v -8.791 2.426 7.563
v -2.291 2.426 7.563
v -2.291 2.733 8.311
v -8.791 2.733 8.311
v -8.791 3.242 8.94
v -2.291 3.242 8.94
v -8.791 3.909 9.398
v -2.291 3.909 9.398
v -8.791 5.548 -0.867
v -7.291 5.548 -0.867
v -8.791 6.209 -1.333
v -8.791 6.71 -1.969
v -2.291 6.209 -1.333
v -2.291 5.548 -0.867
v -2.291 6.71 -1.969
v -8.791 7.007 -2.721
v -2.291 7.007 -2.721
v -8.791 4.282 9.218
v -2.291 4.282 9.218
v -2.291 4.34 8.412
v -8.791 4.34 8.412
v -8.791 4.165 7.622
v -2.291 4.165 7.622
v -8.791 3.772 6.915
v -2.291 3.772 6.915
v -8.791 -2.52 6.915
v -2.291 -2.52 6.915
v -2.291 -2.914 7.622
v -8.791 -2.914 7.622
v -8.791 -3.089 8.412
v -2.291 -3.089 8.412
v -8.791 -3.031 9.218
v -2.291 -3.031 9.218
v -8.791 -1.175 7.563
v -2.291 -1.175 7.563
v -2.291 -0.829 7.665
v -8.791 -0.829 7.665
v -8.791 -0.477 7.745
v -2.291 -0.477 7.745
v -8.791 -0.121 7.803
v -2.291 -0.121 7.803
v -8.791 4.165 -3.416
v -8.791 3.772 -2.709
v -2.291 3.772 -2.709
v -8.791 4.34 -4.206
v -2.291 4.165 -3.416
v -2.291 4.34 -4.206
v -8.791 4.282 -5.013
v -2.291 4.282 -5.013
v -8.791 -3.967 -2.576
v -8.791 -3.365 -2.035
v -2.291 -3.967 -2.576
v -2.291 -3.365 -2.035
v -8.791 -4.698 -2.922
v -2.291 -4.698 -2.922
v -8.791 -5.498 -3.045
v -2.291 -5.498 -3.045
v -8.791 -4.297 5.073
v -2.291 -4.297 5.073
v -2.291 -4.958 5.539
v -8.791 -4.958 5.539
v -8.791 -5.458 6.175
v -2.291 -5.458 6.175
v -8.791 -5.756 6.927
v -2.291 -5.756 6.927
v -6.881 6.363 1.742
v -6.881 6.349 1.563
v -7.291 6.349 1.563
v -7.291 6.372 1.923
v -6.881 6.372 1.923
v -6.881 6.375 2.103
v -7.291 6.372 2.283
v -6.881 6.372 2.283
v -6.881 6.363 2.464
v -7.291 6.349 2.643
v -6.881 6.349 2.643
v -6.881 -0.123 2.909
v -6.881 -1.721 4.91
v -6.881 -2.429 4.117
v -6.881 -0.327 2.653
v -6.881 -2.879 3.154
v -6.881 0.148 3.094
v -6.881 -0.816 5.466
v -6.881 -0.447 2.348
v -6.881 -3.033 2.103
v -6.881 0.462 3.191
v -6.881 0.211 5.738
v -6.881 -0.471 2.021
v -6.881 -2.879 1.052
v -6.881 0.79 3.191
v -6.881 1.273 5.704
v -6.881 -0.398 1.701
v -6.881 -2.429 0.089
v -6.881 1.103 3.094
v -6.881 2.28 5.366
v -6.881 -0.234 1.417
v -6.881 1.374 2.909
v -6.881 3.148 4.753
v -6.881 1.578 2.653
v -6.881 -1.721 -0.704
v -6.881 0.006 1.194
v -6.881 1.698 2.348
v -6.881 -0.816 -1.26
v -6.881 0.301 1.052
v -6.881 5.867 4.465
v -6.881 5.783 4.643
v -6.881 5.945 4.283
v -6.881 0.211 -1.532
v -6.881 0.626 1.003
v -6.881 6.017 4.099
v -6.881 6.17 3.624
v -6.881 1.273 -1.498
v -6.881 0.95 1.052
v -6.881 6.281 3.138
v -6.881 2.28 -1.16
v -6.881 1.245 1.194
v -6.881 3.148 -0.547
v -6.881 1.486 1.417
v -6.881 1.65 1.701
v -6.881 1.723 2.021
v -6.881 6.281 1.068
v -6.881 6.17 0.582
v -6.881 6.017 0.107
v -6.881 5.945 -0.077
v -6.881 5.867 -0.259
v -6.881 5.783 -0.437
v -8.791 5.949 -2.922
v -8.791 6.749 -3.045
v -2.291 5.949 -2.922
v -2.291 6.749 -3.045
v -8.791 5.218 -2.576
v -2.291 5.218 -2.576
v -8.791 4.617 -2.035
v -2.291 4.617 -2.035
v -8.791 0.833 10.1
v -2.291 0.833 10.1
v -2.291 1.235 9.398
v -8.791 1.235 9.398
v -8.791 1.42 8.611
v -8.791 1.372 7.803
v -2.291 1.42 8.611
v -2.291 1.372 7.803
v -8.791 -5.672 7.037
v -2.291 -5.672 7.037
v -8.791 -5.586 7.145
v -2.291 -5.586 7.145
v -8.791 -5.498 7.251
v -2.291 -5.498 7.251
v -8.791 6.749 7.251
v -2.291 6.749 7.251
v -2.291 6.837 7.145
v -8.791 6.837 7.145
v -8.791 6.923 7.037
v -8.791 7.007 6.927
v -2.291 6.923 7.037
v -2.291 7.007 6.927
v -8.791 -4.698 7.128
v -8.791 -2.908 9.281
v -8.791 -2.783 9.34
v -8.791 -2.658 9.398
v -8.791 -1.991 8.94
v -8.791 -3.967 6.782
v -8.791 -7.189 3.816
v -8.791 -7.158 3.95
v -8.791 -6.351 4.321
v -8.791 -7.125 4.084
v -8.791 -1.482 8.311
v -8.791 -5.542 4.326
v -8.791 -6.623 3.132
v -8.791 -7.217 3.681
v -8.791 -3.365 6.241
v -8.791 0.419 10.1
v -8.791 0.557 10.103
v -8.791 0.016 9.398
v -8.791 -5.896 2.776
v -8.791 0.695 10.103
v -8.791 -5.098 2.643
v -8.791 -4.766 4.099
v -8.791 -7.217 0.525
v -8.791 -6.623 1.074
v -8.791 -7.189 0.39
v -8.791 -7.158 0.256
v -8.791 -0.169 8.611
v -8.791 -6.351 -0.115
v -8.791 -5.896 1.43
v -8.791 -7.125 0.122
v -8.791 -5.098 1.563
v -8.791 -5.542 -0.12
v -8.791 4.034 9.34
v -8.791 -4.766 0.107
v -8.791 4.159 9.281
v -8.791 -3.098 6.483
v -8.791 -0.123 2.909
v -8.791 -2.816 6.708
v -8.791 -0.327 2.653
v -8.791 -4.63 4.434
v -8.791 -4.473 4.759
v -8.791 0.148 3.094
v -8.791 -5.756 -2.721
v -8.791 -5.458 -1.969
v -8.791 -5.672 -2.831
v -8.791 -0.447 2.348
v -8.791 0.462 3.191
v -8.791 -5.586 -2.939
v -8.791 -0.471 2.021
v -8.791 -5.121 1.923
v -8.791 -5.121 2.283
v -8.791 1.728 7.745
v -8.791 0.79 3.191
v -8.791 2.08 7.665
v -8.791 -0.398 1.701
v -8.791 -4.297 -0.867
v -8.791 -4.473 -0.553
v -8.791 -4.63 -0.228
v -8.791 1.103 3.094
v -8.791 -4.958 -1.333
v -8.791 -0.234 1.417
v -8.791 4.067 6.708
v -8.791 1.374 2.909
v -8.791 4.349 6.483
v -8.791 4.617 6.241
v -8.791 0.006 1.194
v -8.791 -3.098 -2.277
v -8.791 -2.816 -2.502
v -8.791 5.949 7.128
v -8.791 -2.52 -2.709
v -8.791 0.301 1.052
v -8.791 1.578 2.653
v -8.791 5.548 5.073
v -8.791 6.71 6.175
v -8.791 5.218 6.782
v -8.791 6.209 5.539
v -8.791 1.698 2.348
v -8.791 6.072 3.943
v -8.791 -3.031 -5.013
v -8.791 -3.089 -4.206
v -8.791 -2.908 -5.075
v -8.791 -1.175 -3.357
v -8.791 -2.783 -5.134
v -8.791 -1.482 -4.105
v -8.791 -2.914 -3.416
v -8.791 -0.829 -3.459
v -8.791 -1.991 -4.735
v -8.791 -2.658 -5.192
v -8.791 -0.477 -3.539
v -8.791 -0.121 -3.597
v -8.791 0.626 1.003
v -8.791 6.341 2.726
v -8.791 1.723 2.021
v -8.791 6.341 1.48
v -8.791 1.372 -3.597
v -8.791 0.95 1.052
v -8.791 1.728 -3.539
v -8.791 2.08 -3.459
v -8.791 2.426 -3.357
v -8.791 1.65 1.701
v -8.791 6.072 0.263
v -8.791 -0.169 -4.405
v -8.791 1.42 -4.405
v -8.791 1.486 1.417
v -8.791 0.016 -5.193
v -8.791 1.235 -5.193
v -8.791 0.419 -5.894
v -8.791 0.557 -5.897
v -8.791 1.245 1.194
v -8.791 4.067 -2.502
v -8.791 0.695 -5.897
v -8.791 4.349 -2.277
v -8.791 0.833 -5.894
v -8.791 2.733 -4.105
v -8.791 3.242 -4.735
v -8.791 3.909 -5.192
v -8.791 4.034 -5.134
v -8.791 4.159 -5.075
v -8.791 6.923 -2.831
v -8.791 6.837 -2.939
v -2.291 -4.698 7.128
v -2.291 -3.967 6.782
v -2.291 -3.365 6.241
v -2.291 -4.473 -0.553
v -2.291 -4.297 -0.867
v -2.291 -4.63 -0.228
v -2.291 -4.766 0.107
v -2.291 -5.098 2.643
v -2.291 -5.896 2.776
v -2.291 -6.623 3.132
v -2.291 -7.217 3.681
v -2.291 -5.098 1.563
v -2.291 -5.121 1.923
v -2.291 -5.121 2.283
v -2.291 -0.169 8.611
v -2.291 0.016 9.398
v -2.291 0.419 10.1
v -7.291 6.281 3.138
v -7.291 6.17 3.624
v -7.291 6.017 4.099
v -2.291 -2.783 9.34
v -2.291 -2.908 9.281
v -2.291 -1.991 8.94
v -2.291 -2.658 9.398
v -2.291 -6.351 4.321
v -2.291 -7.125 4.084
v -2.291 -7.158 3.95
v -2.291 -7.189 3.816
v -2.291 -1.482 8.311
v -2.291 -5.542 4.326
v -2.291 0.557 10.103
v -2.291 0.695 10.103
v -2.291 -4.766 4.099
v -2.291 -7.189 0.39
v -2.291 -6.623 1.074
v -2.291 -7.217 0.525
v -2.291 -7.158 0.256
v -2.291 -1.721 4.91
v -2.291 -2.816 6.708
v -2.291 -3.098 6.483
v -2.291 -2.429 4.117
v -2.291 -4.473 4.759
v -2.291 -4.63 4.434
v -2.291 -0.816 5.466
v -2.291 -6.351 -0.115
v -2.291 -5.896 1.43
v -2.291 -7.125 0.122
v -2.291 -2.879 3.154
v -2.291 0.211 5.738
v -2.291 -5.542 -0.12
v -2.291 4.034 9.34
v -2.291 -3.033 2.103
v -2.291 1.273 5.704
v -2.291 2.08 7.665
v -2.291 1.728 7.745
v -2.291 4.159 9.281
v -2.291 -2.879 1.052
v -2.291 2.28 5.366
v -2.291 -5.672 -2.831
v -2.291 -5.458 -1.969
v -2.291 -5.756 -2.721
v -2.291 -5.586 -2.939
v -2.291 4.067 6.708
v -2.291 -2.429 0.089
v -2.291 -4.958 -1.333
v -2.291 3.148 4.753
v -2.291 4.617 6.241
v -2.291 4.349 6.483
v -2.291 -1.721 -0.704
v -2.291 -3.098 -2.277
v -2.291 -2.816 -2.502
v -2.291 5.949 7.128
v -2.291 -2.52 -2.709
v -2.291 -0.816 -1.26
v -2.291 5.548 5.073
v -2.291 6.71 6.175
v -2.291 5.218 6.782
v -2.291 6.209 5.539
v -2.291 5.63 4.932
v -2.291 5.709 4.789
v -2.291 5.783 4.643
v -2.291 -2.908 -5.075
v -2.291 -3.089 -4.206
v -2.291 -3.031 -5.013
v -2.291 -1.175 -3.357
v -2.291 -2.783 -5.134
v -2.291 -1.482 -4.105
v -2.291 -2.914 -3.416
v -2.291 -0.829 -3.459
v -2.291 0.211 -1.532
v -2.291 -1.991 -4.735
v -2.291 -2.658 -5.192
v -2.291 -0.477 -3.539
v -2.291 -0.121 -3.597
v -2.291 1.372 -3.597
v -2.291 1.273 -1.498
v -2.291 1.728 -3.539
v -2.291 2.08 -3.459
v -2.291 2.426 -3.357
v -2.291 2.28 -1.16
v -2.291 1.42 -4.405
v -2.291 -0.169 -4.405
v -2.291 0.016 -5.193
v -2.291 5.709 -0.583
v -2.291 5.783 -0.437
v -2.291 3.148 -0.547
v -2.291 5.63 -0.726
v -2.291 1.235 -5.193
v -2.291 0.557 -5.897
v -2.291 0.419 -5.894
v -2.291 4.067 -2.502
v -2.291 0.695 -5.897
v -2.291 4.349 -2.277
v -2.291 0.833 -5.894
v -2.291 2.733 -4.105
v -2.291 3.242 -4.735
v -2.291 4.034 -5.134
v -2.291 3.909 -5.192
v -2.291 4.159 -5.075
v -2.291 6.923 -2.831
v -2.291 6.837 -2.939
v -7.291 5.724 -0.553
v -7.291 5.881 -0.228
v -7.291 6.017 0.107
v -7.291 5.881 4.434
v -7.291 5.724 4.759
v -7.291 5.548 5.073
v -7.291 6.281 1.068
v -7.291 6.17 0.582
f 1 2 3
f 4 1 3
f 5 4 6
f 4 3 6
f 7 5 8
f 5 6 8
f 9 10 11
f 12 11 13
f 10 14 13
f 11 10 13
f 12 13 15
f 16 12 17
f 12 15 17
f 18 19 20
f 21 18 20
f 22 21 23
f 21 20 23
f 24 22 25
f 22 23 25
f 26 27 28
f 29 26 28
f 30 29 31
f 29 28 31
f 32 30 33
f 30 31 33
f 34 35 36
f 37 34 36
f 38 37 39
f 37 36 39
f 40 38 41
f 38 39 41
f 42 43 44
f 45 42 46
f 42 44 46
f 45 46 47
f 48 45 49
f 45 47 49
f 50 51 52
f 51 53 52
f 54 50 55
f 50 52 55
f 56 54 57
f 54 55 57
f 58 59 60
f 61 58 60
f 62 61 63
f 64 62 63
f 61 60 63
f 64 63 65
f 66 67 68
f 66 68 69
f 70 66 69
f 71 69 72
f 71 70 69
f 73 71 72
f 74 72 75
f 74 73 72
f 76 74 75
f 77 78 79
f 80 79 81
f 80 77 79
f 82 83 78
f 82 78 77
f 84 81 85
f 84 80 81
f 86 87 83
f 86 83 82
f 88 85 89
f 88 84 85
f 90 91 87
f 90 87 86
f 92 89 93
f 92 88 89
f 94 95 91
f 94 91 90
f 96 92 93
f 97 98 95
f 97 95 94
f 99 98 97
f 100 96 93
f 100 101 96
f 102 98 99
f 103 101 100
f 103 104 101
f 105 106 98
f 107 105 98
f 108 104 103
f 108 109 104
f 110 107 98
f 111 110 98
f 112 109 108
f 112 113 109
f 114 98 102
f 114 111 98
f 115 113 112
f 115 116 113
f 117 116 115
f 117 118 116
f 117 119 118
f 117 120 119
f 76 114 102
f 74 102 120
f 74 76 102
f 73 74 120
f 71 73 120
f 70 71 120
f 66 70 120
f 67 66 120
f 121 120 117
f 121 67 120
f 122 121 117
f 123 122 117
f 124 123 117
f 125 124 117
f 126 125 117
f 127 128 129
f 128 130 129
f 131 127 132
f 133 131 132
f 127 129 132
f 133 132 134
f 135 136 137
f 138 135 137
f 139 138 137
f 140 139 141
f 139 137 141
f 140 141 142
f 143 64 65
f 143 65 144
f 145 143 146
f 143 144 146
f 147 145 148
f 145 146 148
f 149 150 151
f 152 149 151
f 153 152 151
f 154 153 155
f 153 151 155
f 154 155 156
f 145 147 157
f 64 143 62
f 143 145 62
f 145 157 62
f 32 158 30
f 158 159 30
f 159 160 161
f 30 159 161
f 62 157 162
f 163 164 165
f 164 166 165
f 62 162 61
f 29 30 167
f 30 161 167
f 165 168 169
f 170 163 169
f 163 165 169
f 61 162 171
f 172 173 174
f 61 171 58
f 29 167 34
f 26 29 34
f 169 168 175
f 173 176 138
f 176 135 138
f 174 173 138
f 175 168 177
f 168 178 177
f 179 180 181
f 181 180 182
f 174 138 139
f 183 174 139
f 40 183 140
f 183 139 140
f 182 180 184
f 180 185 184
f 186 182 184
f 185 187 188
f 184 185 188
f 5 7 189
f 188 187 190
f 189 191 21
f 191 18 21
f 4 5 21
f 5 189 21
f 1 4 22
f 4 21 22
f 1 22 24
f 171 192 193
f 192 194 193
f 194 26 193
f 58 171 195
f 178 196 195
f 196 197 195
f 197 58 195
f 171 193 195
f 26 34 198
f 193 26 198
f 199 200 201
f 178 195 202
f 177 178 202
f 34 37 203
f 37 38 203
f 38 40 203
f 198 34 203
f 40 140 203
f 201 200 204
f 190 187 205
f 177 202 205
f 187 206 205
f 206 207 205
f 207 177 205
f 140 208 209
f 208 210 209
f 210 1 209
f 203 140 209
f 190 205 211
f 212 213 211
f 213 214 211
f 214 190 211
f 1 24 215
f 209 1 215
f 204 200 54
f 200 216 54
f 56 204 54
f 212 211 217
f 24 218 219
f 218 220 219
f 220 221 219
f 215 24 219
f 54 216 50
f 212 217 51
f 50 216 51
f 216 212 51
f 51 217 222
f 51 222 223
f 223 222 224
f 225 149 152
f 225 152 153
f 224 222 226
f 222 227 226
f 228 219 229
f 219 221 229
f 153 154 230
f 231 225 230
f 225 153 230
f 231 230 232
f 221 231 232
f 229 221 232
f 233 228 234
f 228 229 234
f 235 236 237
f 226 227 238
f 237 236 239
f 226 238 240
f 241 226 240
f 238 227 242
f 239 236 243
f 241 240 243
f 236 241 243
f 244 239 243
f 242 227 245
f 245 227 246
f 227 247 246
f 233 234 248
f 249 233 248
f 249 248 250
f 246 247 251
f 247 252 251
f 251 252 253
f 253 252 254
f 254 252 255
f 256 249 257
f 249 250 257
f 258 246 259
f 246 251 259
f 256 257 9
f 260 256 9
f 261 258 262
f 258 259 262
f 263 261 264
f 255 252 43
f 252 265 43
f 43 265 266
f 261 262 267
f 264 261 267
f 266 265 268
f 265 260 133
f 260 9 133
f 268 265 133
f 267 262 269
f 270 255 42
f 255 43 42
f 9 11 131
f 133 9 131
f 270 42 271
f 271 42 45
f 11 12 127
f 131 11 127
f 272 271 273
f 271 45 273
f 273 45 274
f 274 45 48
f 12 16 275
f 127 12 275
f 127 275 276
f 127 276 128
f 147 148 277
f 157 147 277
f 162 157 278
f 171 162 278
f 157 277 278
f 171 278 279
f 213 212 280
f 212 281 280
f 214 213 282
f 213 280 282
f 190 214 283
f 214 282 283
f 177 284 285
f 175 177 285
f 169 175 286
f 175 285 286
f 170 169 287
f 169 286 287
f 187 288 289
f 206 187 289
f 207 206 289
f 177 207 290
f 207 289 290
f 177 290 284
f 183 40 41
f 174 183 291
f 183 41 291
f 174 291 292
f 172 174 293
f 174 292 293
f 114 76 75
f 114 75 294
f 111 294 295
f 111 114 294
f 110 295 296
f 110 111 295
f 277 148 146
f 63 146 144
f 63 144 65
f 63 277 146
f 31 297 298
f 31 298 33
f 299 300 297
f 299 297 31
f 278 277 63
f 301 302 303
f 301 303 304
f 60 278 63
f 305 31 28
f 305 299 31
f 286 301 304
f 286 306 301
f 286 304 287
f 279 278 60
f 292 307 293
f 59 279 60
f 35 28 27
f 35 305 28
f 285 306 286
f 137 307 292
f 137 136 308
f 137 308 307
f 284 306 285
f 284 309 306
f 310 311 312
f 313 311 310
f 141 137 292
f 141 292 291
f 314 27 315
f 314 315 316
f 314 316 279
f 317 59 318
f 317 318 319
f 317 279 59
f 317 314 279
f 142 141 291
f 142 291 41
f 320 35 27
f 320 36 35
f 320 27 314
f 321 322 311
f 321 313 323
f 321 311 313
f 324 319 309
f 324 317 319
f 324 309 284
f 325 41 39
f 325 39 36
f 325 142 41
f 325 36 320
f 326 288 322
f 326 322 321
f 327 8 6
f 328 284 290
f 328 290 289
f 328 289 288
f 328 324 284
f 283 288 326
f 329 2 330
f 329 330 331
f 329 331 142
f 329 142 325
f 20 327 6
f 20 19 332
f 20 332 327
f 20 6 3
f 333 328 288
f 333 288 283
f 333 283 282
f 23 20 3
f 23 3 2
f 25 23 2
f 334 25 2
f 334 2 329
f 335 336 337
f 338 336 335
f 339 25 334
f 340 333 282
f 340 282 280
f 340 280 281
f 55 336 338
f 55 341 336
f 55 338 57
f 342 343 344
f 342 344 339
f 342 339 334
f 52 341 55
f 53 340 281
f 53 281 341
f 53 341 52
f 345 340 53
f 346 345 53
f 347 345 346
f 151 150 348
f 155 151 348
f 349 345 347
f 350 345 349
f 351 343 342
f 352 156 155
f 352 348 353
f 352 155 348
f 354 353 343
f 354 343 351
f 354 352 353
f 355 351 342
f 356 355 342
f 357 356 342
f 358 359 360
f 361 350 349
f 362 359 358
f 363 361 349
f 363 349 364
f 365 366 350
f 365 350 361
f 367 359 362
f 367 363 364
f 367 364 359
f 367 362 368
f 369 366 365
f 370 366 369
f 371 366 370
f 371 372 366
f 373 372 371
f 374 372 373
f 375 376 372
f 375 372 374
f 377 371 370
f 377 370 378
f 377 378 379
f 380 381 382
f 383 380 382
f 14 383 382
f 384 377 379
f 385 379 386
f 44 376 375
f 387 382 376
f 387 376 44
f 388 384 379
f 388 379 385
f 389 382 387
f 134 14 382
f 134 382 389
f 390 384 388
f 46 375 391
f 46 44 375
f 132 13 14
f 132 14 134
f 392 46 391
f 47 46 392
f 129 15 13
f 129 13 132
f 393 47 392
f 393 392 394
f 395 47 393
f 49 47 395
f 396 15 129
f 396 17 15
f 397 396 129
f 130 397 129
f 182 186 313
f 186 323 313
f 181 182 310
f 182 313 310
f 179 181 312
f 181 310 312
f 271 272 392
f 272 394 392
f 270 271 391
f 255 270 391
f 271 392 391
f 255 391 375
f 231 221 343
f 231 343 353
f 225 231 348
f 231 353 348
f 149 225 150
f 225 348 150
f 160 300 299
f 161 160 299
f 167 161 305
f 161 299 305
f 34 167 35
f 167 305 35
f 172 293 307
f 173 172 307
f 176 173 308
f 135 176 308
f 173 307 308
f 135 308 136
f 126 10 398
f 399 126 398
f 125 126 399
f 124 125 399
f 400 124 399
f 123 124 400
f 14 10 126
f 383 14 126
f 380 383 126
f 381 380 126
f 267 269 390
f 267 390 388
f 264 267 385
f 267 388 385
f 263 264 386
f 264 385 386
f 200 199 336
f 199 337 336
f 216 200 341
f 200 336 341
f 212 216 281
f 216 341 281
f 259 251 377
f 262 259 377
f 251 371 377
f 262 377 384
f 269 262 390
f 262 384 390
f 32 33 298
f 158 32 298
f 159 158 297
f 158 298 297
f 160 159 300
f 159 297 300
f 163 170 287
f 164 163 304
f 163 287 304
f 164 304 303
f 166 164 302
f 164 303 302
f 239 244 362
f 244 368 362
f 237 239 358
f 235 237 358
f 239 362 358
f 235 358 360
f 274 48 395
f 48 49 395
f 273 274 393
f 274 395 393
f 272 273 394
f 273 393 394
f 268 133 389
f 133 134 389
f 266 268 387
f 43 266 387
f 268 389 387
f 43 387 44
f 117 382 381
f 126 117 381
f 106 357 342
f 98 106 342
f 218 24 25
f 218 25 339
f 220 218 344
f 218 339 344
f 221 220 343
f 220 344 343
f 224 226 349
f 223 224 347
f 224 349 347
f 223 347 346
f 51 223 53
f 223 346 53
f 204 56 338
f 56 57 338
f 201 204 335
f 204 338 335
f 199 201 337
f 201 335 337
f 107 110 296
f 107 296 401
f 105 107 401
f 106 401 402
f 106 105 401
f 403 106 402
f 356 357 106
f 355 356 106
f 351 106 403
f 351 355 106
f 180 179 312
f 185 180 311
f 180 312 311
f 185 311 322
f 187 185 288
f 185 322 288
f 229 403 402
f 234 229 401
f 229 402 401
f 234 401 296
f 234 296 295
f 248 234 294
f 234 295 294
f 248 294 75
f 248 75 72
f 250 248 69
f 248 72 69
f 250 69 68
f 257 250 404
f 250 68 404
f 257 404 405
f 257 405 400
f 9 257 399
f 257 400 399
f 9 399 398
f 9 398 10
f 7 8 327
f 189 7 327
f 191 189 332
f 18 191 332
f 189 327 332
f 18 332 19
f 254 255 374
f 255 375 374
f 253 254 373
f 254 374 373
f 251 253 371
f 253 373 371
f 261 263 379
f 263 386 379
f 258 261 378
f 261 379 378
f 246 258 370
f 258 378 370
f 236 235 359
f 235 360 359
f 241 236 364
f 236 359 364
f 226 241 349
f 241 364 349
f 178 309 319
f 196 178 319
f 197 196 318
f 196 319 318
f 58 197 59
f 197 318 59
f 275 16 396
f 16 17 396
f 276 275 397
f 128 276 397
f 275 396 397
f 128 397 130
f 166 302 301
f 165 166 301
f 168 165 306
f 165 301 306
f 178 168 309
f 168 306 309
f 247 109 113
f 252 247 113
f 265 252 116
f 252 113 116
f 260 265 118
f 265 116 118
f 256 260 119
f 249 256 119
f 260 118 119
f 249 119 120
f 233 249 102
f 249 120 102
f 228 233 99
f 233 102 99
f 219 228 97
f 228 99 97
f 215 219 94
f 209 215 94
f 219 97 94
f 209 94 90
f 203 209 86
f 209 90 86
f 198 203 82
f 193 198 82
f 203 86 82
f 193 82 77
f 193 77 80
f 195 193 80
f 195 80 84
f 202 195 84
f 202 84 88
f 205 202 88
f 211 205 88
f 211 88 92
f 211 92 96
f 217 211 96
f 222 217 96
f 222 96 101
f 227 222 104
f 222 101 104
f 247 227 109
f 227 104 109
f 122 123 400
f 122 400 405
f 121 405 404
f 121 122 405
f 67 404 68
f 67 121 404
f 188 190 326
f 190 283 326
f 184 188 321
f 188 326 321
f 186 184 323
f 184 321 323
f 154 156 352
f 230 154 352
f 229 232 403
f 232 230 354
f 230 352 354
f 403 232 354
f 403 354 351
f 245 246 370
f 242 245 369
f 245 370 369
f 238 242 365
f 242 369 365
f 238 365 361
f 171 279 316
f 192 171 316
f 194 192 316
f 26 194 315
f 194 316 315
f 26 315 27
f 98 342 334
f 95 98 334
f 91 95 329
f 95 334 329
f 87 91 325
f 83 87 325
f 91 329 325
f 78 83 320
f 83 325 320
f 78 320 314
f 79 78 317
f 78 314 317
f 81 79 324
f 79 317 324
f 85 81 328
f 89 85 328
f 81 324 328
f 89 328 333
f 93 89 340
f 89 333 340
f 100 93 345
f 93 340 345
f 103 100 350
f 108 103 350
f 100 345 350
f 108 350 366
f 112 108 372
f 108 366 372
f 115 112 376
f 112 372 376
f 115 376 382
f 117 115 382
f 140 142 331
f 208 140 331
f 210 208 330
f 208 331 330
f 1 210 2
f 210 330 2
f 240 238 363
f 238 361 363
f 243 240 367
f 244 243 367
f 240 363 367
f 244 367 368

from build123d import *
from build123d.topology import SkipClean

# Parameters (mm, degrees)
SKETCH1_R           = 2
BOSS_EXTRUDE1_DEPTH = 5
SKETCH2_R           = 2
CUT_EXTRUDE1_DEPTH  = 4.59
CUT_EXTRUDE2_DEPTH  = 4.59
SKETCH4_R           = 2
BOSS_EXTRUDE2_DEPTH = 1.5
SKETCH5_R           = 2
SKETCH5_R_2         = 1.1
BOSS_EXTRUDE3_DEPTH = 1.91


with BuildPart() as part:
    # Sketch1 → Boss-Extrude1 (new body)
    with BuildSketch(Plane(origin=(-2.290735361, 0, 0), x_dir=(0, 0, -1), z_dir=(1, 0, 0))):
        with BuildLine():
            ThreePointArc((-9.21847302, -3.030854589), (-8.010225793, -3.030179432), (-6.914755008, -2.520468161))
            ThreePointArc((-6.914755008, -2.520468161), (-6.597726247, -2.958835077), (-6.240895641, -3.365461082))
            ThreePointArc((-6.240895641, -3.365461082), (-6.981592568, -4.320044698), (-7.251111098, -5.497848409))
            ThreePointArc((-7.251111098, -5.497848409), (-7.090895469, -5.629044066), (-6.927337829, -5.756048975))
            ThreePointArc((-6.927337829, -5.756048975), (-5.839037632, -5.231201855), (-5.073207991, -4.296660909))
            ThreePointArc((-5.073207991, -4.296660909), (-4.59737467, -4.554062228), (-4.099452992, -4.765596601))
            ThreePointArc((-4.099452992, -4.765596601), (-4.352619555, -5.947023074), (-4.084417482, -7.125127257))
            ThreePointArc((-4.084417482, -7.125127257), (-3.883144525, -7.173815504), (-3.680678819, -7.217277972))
            ThreePointArc((-3.680678819, -7.217277972), (-2.927876853, -6.272211298), (-2.643370309, -5.097937972))
            ThreePointArc((-2.643370309, -5.097937972), (-2.102977054, -5.123392206), (-1.562583798, -5.097937972))
            ThreePointArc((-1.562583798, -5.097937972), (-1.278077254, -6.272211298), (-0.525275288, -7.217277972))
            ThreePointArc((-0.525275288, -7.217277972), (-0.322809582, -7.173815504), (-0.121536626, -7.125127257))
            ThreePointArc((-0.121536626, -7.125127257), (0.146665447, -5.947023074), (-0.106501116, -4.765596601))
            ThreePointArc((-0.106501116, -4.765596601), (0.391420562, -4.554062228), (0.867253884, -4.296660909))
            ThreePointArc((0.867253884, -4.296660909), (1.633083524, -5.231201855), (2.721383721, -5.756048975))
            ThreePointArc((2.721383721, -5.756048975), (2.884941361, -5.629044066), (3.04515699, -5.497848409))
            ThreePointArc((3.04515699, -5.497848409), (2.77563846, -4.320044698), (2.034941533, -3.365461082))
            ThreePointArc((2.034941533, -3.365461082), (2.391772139, -2.958835077), (2.708800901, -2.520468161))
            ThreePointArc((2.708800901, -2.520468161), (3.804271685, -3.030179432), (5.012518913, -3.030854589))
            ThreePointArc((5.012518913, -3.030854589), (5.104773889, -2.845462119), (5.192199521, -2.65774396))
            ThreePointArc((5.192199521, -2.65774396), (4.438341838, -1.713519192), (3.356818658, -1.174845424))
            ThreePointArc((3.356818658, -1.174845424), (3.501883513, -0.653665056), (3.597316282, -0.121156487))
            ThreePointArc((3.597316282, -0.121156487), (4.805456786, -0.105083514), (5.894342862, 0.418547016))
            ThreePointArc((5.894342862, 0.418547016), (5.897022946, 0.625607794), (5.894342862, 0.832668571))
            ThreePointArc((5.894342862, 0.832668571), (4.805456786, 1.356299101), (3.597316282, 1.372372074))
            ThreePointArc((3.597316282, 1.372372074), (3.501883513, 1.904880643), (3.356818658, 2.426061011))
            ThreePointArc((3.356818658, 2.426061011), (4.438341838, 2.964734779), (5.192199521, 3.908959547))
            ThreePointArc((5.192199521, 3.908959547), (5.104773889, 4.096677707), (5.012518913, 4.282070176))
            ThreePointArc((5.012518913, 4.282070176), (3.804271685, 4.281395019), (2.708800901, 3.771683749))
            ThreePointArc((2.708800901, 3.771683749), (2.391772139, 4.210050664), (2.034941533, 4.616676669))
            ThreePointArc((2.034941533, 4.616676669), (2.77563846, 5.571260286), (3.04515699, 6.749063996))
            ThreePointArc((3.04515699, 6.749063996), (2.884941361, 6.880259653), (2.721383721, 7.007264562))
            ThreePointArc((2.721383721, 7.007264562), (1.633083524, 6.482417443), (0.867253884, 5.547876496))
            ThreePointArc((0.867253884, 5.547876496), (0.391420562, 5.805277815), (-0.106501116, 6.016812189))
            ThreePointArc((-0.106501116, 6.016812189), (0.146665447, 7.198238661), (-0.121536626, 8.376342845))
            ThreePointArc((-0.121536626, 8.376342845), (-0.322809582, 8.425031091), (-0.525275288, 8.46849356))
            ThreePointArc((-0.525275288, 8.46849356), (-1.278077254, 7.523426886), (-1.562583798, 6.349153559))
            ThreePointArc((-1.562583798, 6.349153559), (-2.102977054, 6.374607794), (-2.643370309, 6.349153559))
            ThreePointArc((-2.643370309, 6.349153559), (-2.927876853, 7.523426886), (-3.680678819, 8.46849356))
            ThreePointArc((-3.680678819, 8.46849356), (-3.883144525, 8.425031091), (-4.084417482, 8.376342845))
            ThreePointArc((-4.084417482, 8.376342845), (-4.352619555, 7.198238661), (-4.099452992, 6.016812189))
            ThreePointArc((-4.099452992, 6.016812189), (-4.59737467, 5.805277815), (-5.073207991, 5.547876496))
            ThreePointArc((-5.073207991, 5.547876496), (-5.839037632, 6.482417443), (-6.927337829, 7.007264562))
            ThreePointArc((-6.927337829, 7.007264562), (-7.090895469, 6.880259653), (-7.251111098, 6.749063996))
            ThreePointArc((-7.251111098, 6.749063996), (-6.981592568, 5.571260286), (-6.240895641, 4.616676669))
            ThreePointArc((-6.240895641, 4.616676669), (-6.597726247, 4.210050664), (-6.914755008, 3.771683749))
            ThreePointArc((-6.914755008, 3.771683749), (-8.010225793, 4.281395019), (-9.21847302, 4.282070176))
            ThreePointArc((-9.21847302, 4.282070176), (-9.310727997, 4.096677707), (-9.398153629, 3.908959547))
            ThreePointArc((-9.398153629, 3.908959547), (-8.644295946, 2.964734779), (-7.562772765, 2.426061011))
            ThreePointArc((-7.562772765, 2.426061011), (-7.707837621, 1.904880643), (-7.803270389, 1.372372074))
            ThreePointArc((-7.803270389, 1.372372074), (-9.011410893, 1.356299101), (-10.10029697, 0.832668571))
            ThreePointArc((-10.10029697, 0.832668571), (-10.102977054, 0.625607794), (-10.10029697, 0.418547016))
            ThreePointArc((-10.10029697, 0.418547016), (-9.011410893, -0.105083514), (-7.803270389, -0.121156487))
            ThreePointArc((-7.803270389, -0.121156487), (-7.707837621, -0.653665056), (-7.562772765, -1.174845424))
            ThreePointArc((-7.562772765, -1.174845424), (-8.644295946, -1.713519192), (-9.398153629, -2.65774396))
            ThreePointArc((-9.398153629, -2.65774396), (-9.310727997, -2.845462119), (-9.21847302, -3.030854589))
        make_face()
        with Locations(Location((-2.102977054, 0.625607794, 0), (0, 0, 180))):
            Circle(SKETCH1_R, mode=Mode.SUBTRACT)
    extrude(amount=-BOSS_EXTRUDE1_DEPTH)

    # Sketch2 → Cut-Extrude1 (cut)
    with BuildSketch(Plane(origin=(-2.290735361, 0, 0), x_dir=(0, 0, -1), z_dir=(1, 0, 0))):
        with BuildLine():
            ThreePointArc((-1.562583798, 6.349153559), (-1.832480848, 6.368240709), (-2.102977054, 6.374607794))
            ThreePointArc((-2.102977054, 6.374607794), (-2.373473259, 6.368240709), (-2.643370309, 6.349153559))
            ThreePointArc((-2.643370309, 6.349153559), (-2.927876853, 7.523426886), (-3.680678819, 8.46849356))
            ThreePointArc((-3.680678819, 8.46849356), (-3.883144525, 8.425031091), (-4.084417482, 8.376342845))
            ThreePointArc((-4.084417482, 8.376342845), (-4.352619555, 7.198238661), (-4.099452992, 6.016812189))
            ThreePointArc((-4.099452992, 6.016812189), (-4.374229098, 5.906934819), (-4.642987089, 5.783063564))
            Line((-4.642987089, 5.783063564), (-4.752977054, 3.148295163))
            ThreePointArc((-4.752977054, 3.148295163), (-2.102977054, -3.033142206), (0.547022946, 3.148295163))
            Line((0.547022946, 3.148295163), (0.437032981, 5.783063564))
            ThreePointArc((0.437032981, 5.783063564), (0.168274991, 5.906934819), (-0.106501116, 6.016812189))
            ThreePointArc((-0.106501116, 6.016812189), (0.146665447, 7.198238661), (-0.121536626, 8.376342845))
            ThreePointArc((-0.121536626, 8.376342845), (-0.322809582, 8.425031091), (-0.525275288, 8.46849356))
            ThreePointArc((-0.525275288, 8.46849356), (-1.278077254, 7.523426886), (-1.562583798, 6.349153559))
        make_face()
        with Locations((-2.102977054, 0.625607794)):
            Circle(SKETCH2_R, mode=Mode.SUBTRACT)
    extrude(amount=-CUT_EXTRUDE1_DEPTH, mode=Mode.SUBTRACT)

    # Sketch3 → Cut-Extrude2 (cut)
    with BuildSketch(Plane(origin=(-6.880735361, 0, 0), x_dir=(0, 0, -1), z_dir=(1, 0, 0))):
        with BuildLine():
            Line((-4.428262518, 5.883368582), (-5.037365747, 8.852267241))
            Line((-5.037365747, 8.852267241), (0.413398915, 8.665739173))
            Line((0.413398915, 8.665739173), (0.316720883, 5.840592251))
            ThreePointArc((0.316720883, 5.840592251), (-2.051151554, 6.374374193), (-4.428262518, 5.883368582))
        make_face()
    extrude(amount=-CUT_EXTRUDE2_DEPTH, mode=Mode.SUBTRACT)

    # Sketch4 → Boss-Extrude2 (add)
    with SkipClean():  # the faces are left unmerged after this step: merging them gives an invalid solid
        with BuildSketch(Plane.ZY.offset(7.290735361)):
            with BuildLine():
                ThreePointArc((6.927337829, 7.007264562), (5.839037632, 6.482417443), (5.073207991, 5.547876496))
                ThreePointArc((5.073207991, 5.547876496), (2.102977054, 6.374607794), (-0.867253884, 5.547876496))
                ThreePointArc((-0.867253884, 5.547876496), (-1.633083524, 6.482417443), (-2.721383721, 7.007264562))
                ThreePointArc((-2.721383721, 7.007264562), (-2.884941361, 6.880259653), (-3.04515699, 6.749063996))
                ThreePointArc((-3.04515699, 6.749063996), (-2.77563846, 5.571260286), (-2.034941533, 4.616676669))
                ThreePointArc((-2.034941533, 4.616676669), (-2.391772139, 4.210050664), (-2.708800901, 3.771683749))
                ThreePointArc((-2.708800901, 3.771683749), (-3.804271685, 4.281395019), (-5.012518913, 4.282070176))
                ThreePointArc((-5.012518913, 4.282070176), (-5.104773889, 4.096677707), (-5.192199521, 3.908959547))
                ThreePointArc((-5.192199521, 3.908959547), (-4.438341838, 2.964734779), (-3.356818658, 2.426061011))
                ThreePointArc((-3.356818658, 2.426061011), (-3.501883513, 1.904880643), (-3.597316282, 1.372372074))
                ThreePointArc((-3.597316282, 1.372372074), (-4.805456786, 1.356299101), (-5.894342862, 0.832668571))
                ThreePointArc((-5.894342862, 0.832668571), (-5.897022946, 0.625607794), (-5.894342862, 0.418547016))
                ThreePointArc((-5.894342862, 0.418547016), (-4.805456786, -0.105083514), (-3.597316282, -0.121156487))
                ThreePointArc((-3.597316282, -0.121156487), (-3.501883513, -0.653665056), (-3.356818658, -1.174845424))
                ThreePointArc((-3.356818658, -1.174845424), (-4.438341838, -1.713519192), (-5.192199521, -2.65774396))
                ThreePointArc((-5.192199521, -2.65774396), (-5.104773889, -2.845462119), (-5.012518913, -3.030854589))
                ThreePointArc((-5.012518913, -3.030854589), (-3.804271685, -3.030179432), (-2.708800901, -2.520468161))
                ThreePointArc((-2.708800901, -2.520468161), (-2.391772139, -2.958835077), (-2.034941533, -3.365461082))
                ThreePointArc((-2.034941533, -3.365461082), (-2.77563846, -4.320044698), (-3.04515699, -5.497848409))
                ThreePointArc((-3.04515699, -5.497848409), (-2.884941361, -5.629044066), (-2.721383721, -5.756048975))
                ThreePointArc((-2.721383721, -5.756048975), (-1.633083524, -5.231201855), (-0.867253884, -4.296660909))
                ThreePointArc((-0.867253884, -4.296660909), (-0.391420562, -4.554062228), (0.106501116, -4.765596601))
                ThreePointArc((0.106501116, -4.765596601), (-0.146665447, -5.947023074), (0.121536626, -7.125127257))
                ThreePointArc((0.121536626, -7.125127257), (0.322809582, -7.173815504), (0.525275288, -7.217277972))
                ThreePointArc((0.525275288, -7.217277972), (1.278077254, -6.272211298), (1.562583798, -5.097937972))
                ThreePointArc((1.562583798, -5.097937972), (2.102977054, -5.123392206), (2.643370309, -5.097937972))
                ThreePointArc((2.643370309, -5.097937972), (2.927876853, -6.272211298), (3.680678819, -7.217277972))
                ThreePointArc((3.680678819, -7.217277972), (3.883144525, -7.173815504), (4.084417482, -7.125127257))
                ThreePointArc((4.084417482, -7.125127257), (4.352619555, -5.947023074), (4.099452992, -4.765596601))
                ThreePointArc((4.099452992, -4.765596601), (4.59737467, -4.554062228), (5.073207991, -4.296660909))
                ThreePointArc((5.073207991, -4.296660909), (5.839037632, -5.231201855), (6.927337829, -5.756048975))
                ThreePointArc((6.927337829, -5.756048975), (7.090895469, -5.629044066), (7.251111098, -5.497848409))
                ThreePointArc((7.251111098, -5.497848409), (6.981592568, -4.320044698), (6.240895641, -3.365461082))
                ThreePointArc((6.240895641, -3.365461082), (6.597726247, -2.958835077), (6.914755008, -2.520468161))
                ThreePointArc((6.914755008, -2.520468161), (8.010225793, -3.030179432), (9.21847302, -3.030854589))
                ThreePointArc((9.21847302, -3.030854589), (9.310727997, -2.845462119), (9.398153629, -2.65774396))
                ThreePointArc((9.398153629, -2.65774396), (8.644295946, -1.713519192), (7.562772765, -1.174845424))
                ThreePointArc((7.562772765, -1.174845424), (7.707837621, -0.653665056), (7.803270389, -0.121156487))
                ThreePointArc((7.803270389, -0.121156487), (9.011410893, -0.105083514), (10.10029697, 0.418547016))
                ThreePointArc((10.10029697, 0.418547016), (10.102977054, 0.625607794), (10.10029697, 0.832668571))
                ThreePointArc((10.10029697, 0.832668571), (9.011410893, 1.356299101), (7.803270389, 1.372372074))
                ThreePointArc((7.803270389, 1.372372074), (7.707837621, 1.904880643), (7.562772765, 2.426061011))
                ThreePointArc((7.562772765, 2.426061011), (8.644295946, 2.964734779), (9.398153629, 3.908959547))
                ThreePointArc((9.398153629, 3.908959547), (9.310727997, 4.096677707), (9.21847302, 4.282070176))
                ThreePointArc((9.21847302, 4.282070176), (8.010225793, 4.281395019), (6.914755008, 3.771683749))
                ThreePointArc((6.914755008, 3.771683749), (6.597726247, 4.210050664), (6.240895641, 4.616676669))
                ThreePointArc((6.240895641, 4.616676669), (6.981592568, 5.571260286), (7.251111098, 6.749063996))
                ThreePointArc((7.251111098, 6.749063996), (7.090895469, 6.880259653), (6.927337829, 7.007264562))
            make_face()
            with Locations(Location((2.102977054, 0.625607794, 0), (0, 0, 180))):
                Circle(SKETCH4_R, mode=Mode.SUBTRACT)
        extrude(amount=BOSS_EXTRUDE2_DEPTH)

    # Sketch5 → Boss-Extrude3 (add, through all)
    with BuildSketch(Plane(origin=(-6.880735361, 0, 0), x_dir=(0, 0, -1), z_dir=(1, 0, 0))):
        with Locations((-2.102977054, 0.625607794)):
            Circle(SKETCH5_R)
        with Locations((-2.102977054, 0.625607794)):
            Circle(SKETCH5_R_2, mode=Mode.SUBTRACT)
    extrude(amount=-BOSS_EXTRUDE3_DEPTH)


solid = part.part
